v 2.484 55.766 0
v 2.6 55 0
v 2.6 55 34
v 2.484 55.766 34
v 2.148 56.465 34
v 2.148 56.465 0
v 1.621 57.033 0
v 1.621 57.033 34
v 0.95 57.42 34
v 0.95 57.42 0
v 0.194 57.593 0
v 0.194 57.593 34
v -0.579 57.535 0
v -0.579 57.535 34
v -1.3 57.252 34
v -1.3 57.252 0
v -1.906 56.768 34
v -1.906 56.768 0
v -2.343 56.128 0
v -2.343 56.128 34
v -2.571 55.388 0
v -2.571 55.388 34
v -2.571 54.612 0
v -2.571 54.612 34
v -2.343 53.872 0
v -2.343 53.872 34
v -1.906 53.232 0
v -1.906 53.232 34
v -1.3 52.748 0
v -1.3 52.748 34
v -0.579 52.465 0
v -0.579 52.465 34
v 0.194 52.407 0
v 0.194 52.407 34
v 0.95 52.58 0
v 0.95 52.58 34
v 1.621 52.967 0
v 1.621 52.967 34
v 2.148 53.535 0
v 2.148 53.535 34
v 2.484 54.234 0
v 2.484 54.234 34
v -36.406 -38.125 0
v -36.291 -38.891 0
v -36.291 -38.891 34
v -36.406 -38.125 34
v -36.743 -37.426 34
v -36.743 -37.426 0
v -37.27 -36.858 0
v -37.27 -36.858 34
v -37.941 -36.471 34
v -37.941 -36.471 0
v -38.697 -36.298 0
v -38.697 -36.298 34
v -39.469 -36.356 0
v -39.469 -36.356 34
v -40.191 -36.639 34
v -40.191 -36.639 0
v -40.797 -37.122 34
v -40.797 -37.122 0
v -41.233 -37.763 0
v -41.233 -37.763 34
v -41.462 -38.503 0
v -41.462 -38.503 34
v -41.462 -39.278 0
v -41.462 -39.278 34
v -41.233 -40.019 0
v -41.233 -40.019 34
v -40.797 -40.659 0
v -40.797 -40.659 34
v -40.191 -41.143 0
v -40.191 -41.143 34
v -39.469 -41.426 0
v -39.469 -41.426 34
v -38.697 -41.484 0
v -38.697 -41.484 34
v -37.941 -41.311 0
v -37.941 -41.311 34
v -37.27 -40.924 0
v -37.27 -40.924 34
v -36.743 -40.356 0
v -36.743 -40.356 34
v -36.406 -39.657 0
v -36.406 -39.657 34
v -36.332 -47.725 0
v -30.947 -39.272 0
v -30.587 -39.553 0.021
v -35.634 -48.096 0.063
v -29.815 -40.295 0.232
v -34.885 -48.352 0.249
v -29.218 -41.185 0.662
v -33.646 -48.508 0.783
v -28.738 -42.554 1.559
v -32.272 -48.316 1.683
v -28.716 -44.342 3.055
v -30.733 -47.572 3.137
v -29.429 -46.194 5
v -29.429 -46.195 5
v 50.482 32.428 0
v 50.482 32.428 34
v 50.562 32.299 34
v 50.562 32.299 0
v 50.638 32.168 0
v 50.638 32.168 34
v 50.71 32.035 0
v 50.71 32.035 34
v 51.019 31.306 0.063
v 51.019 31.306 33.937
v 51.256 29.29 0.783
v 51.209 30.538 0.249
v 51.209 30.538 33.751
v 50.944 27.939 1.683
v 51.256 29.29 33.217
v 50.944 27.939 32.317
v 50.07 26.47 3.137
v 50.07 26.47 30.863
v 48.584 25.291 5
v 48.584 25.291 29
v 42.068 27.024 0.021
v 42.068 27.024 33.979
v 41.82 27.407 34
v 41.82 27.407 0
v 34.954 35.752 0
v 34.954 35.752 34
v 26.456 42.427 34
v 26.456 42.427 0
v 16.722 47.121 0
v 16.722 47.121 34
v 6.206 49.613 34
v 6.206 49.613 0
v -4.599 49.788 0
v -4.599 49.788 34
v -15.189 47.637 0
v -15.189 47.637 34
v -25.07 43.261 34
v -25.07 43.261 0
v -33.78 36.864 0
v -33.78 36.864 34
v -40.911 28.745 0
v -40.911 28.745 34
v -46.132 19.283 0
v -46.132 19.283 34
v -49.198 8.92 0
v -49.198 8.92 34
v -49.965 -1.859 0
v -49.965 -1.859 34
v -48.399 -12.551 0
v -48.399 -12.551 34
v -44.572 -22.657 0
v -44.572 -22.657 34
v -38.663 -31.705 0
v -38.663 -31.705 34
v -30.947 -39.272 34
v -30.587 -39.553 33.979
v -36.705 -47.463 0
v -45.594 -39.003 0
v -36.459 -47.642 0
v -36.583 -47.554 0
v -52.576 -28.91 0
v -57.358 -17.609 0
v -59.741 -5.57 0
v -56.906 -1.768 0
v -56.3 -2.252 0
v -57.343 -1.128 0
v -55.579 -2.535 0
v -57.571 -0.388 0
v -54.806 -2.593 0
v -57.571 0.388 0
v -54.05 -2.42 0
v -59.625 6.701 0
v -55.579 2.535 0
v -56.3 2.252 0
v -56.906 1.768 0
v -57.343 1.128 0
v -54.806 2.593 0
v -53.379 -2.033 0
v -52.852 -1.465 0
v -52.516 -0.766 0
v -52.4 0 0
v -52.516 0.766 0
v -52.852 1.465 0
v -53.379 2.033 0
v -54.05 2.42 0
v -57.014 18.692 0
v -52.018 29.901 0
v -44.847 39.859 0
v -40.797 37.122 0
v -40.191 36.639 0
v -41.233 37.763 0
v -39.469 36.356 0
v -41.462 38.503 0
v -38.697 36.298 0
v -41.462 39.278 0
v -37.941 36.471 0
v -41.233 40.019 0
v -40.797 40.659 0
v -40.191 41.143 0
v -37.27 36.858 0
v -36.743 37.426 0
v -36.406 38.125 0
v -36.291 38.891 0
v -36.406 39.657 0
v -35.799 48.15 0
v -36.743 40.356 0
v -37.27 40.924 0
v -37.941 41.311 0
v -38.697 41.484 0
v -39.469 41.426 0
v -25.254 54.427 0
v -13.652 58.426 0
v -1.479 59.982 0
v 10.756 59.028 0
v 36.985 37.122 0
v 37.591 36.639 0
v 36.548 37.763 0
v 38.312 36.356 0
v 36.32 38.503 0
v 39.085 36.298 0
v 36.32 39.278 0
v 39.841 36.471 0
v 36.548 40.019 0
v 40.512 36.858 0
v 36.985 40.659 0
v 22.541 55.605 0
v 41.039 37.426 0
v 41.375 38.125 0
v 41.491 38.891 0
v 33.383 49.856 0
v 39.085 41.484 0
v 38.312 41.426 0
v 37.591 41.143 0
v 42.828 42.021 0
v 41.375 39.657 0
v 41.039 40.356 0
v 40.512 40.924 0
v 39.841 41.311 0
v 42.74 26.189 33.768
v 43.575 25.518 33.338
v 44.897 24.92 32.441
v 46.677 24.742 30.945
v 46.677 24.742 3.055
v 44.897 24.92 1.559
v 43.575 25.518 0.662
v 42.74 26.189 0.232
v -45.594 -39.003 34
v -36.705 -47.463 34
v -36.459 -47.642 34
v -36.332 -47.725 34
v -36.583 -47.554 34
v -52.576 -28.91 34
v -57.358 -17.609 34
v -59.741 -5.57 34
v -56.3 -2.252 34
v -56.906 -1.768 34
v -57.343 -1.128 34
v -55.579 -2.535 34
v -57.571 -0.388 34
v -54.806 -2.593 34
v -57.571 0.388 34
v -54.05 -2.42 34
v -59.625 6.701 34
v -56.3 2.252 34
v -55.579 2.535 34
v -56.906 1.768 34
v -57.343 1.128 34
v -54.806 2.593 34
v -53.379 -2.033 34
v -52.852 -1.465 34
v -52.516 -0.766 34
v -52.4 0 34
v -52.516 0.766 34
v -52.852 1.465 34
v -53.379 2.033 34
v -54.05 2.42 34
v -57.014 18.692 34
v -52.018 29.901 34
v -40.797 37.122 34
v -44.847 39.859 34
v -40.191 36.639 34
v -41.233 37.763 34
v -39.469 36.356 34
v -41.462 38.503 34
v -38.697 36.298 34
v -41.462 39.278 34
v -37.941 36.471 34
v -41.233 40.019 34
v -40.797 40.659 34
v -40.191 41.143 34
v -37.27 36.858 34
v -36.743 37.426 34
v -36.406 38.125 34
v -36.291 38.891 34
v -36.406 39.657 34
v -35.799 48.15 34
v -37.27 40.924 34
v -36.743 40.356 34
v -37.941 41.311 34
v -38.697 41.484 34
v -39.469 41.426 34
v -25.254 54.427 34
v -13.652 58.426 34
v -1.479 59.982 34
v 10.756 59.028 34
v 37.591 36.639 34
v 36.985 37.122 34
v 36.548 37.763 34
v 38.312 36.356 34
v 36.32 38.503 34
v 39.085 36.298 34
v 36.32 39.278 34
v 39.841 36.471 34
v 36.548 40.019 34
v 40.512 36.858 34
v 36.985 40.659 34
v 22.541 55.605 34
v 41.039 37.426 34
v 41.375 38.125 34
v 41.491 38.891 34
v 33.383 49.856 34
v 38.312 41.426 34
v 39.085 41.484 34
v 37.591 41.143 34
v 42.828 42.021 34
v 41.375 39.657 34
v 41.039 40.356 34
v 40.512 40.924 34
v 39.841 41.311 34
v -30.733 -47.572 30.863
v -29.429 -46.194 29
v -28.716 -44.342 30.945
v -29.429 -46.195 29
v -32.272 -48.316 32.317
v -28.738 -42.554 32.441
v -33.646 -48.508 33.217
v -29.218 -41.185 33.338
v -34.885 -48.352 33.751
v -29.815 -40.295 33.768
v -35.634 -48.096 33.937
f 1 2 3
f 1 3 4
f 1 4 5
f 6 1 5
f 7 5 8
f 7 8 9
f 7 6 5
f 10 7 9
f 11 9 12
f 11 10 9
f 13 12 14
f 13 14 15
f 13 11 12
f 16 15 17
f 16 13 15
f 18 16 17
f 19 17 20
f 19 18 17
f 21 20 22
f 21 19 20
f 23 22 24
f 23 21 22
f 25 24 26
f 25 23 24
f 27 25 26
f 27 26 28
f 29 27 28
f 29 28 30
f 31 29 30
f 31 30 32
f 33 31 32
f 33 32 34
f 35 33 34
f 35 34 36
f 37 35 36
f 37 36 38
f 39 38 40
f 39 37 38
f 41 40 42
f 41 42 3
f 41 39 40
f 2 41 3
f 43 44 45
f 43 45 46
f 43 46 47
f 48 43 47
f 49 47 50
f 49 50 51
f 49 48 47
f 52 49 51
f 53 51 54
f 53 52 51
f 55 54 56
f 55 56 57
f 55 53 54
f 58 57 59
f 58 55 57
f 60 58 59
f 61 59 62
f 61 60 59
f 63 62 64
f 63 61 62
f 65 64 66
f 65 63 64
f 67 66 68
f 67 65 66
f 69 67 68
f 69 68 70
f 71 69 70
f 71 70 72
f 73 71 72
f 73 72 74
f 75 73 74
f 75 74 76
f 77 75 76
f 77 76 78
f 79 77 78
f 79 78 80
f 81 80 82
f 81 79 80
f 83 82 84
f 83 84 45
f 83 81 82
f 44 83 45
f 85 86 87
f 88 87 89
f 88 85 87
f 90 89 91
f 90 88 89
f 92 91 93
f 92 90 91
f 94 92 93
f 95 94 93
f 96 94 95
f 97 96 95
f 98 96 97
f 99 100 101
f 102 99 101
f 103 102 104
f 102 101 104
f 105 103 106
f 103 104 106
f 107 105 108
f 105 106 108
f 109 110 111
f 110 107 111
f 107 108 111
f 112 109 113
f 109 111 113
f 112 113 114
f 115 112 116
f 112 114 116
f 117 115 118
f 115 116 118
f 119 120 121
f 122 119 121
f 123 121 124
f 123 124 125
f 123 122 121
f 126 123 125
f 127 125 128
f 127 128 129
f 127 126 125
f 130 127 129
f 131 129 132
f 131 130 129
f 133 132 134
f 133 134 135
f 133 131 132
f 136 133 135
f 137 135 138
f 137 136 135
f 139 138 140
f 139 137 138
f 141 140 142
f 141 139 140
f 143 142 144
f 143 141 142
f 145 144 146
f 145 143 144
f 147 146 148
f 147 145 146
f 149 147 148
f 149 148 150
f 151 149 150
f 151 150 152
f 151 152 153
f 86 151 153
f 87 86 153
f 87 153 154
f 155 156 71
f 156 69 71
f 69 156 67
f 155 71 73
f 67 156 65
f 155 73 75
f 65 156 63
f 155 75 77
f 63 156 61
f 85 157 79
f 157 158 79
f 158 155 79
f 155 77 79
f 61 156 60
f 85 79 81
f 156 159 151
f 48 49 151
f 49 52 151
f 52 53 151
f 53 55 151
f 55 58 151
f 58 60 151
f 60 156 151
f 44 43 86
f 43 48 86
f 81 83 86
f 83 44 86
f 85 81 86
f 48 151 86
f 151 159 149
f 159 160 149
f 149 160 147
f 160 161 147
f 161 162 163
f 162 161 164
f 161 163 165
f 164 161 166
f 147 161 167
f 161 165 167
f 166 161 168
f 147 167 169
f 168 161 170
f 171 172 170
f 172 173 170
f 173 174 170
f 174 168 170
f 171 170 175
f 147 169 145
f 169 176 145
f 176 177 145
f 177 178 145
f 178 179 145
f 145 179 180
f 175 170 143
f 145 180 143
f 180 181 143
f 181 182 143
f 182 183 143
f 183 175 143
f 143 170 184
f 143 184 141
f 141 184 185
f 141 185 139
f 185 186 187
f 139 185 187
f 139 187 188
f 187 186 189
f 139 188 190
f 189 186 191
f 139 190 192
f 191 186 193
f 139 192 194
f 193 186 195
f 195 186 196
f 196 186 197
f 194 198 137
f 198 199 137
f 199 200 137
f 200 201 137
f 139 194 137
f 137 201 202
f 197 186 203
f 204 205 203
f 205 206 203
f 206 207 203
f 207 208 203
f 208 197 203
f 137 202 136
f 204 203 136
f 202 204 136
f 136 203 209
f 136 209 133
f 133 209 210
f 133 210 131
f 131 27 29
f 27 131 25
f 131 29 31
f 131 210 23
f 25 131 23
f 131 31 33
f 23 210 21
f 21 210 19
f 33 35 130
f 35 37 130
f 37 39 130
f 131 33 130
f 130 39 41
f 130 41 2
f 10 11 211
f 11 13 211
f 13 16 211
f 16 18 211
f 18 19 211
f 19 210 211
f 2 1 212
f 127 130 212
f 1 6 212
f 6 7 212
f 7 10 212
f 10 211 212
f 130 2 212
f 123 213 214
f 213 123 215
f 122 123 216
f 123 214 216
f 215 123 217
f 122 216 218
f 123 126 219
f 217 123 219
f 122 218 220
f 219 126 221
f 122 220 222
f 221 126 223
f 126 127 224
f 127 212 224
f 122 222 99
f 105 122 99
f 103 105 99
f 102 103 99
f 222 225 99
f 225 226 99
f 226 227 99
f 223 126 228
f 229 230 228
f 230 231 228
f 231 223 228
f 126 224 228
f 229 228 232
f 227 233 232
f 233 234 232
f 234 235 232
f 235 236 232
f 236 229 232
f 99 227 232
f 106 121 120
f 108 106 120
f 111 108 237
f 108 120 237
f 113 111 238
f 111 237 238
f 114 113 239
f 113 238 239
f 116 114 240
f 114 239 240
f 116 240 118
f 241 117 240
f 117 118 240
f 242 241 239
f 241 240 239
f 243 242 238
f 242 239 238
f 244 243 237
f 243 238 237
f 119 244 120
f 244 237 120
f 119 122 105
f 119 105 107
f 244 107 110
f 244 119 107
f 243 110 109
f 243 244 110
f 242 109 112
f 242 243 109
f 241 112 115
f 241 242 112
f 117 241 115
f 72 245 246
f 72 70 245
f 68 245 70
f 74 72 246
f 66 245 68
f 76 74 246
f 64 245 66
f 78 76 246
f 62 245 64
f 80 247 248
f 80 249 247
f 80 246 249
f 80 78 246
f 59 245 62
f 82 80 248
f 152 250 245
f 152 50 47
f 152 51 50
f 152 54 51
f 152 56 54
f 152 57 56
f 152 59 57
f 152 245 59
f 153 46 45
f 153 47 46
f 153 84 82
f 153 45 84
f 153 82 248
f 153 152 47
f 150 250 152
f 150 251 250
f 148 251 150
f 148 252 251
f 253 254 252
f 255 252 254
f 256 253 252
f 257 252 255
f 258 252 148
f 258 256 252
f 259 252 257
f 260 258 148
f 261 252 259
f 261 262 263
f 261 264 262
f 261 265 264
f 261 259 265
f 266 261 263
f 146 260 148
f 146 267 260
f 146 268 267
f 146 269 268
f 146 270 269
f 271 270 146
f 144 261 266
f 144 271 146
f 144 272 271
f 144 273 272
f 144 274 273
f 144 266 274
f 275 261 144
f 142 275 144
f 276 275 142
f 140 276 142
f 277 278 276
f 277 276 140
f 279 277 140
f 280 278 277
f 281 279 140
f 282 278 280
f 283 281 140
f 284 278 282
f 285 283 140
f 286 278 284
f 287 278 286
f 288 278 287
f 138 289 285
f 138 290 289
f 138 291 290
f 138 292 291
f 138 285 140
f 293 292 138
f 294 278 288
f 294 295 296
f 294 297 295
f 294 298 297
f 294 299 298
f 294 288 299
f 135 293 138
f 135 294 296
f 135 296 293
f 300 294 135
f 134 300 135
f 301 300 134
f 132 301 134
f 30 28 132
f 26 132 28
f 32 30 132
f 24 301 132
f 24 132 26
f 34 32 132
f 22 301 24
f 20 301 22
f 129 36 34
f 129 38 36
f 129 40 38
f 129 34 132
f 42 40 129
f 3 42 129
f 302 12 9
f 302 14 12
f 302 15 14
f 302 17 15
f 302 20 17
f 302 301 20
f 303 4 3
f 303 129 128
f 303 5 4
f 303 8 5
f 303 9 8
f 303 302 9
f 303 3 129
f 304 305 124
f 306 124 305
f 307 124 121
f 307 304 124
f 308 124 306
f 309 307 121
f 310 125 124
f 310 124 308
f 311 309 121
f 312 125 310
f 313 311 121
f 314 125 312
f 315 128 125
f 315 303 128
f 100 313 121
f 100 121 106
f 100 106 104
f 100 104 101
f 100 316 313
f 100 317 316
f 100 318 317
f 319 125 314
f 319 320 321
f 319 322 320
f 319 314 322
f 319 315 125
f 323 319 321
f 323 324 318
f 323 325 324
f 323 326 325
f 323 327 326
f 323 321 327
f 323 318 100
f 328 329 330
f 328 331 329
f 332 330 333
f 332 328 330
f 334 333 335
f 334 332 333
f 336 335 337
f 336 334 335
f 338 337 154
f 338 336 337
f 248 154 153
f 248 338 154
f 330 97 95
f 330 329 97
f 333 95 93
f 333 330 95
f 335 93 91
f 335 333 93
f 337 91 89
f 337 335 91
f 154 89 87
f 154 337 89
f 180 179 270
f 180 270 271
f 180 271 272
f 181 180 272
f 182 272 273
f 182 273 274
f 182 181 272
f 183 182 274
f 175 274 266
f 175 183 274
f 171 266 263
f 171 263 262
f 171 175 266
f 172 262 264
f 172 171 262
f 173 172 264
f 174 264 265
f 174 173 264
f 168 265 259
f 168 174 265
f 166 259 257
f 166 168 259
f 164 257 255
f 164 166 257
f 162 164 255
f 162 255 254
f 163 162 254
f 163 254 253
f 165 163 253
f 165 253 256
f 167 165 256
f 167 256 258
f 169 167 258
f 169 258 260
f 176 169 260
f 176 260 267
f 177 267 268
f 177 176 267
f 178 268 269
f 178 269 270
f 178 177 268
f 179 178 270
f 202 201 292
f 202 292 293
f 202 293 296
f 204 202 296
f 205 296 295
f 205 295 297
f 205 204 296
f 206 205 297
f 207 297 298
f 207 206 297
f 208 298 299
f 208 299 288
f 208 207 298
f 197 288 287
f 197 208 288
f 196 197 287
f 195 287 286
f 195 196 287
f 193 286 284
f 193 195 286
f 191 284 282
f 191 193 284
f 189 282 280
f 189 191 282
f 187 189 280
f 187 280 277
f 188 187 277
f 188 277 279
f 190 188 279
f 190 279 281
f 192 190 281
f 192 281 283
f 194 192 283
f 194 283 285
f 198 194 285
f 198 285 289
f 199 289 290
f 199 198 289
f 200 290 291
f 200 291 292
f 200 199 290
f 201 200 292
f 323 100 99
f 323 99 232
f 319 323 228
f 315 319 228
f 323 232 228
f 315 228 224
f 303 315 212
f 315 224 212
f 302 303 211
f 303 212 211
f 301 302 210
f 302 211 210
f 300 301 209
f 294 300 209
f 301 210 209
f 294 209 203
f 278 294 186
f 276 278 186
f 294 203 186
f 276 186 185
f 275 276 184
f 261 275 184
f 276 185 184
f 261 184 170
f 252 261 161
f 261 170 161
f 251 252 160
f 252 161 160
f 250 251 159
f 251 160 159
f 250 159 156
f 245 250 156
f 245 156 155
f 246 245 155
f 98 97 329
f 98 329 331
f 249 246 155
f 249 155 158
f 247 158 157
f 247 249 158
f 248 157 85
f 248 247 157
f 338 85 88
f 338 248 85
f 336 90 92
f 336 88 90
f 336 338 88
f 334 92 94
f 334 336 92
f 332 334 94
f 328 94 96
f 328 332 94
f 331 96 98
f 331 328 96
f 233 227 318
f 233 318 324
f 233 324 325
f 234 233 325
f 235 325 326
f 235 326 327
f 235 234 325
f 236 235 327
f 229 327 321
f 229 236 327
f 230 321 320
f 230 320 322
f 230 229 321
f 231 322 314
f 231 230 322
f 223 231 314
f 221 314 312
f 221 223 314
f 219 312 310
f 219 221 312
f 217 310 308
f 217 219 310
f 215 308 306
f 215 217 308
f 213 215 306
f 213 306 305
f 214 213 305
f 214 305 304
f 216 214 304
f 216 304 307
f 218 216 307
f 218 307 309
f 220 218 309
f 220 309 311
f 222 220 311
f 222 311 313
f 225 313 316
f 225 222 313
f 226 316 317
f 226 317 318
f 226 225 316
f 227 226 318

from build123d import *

# Parameters (mm, degrees)
SKETCH_2_R          = 60
SKETCH_2_R_2        = 2.6
SKETCH_2_R_3        = 50
EXTRUDE_1_DEPTH     = 34
CUT_EXTRUDE_START   = -34
SKETCH_3_R          = 2.6
CUT_EXTRUDE_1_DEPTH = 34
FILLET_1_R          = 5


with BuildPart() as part:
    # 草图2 → 凸台-拉伸1 (new body)
    with BuildSketch(Plane.XY):
        Circle(SKETCH_2_R)
        with Locations((0, 55)):
            Circle(SKETCH_2_R_2, mode=Mode.SUBTRACT)
        with Locations((38.890872965, 38.890872965)):
            Circle(SKETCH_2_R_2, mode=Mode.SUBTRACT)
        with Locations((55, 0)):
            Circle(SKETCH_2_R_2, mode=Mode.SUBTRACT)
        with Locations((38.890872965, -38.890872965)):
            Circle(SKETCH_2_R_2, mode=Mode.SUBTRACT)
        with Locations((0, -55)):
            Circle(SKETCH_2_R_2, mode=Mode.SUBTRACT)
        with Locations((-38.890872965, -38.890872965)):
            Circle(SKETCH_2_R_2, mode=Mode.SUBTRACT)
        with Locations((-55, 0)):
            Circle(SKETCH_2_R_2, mode=Mode.SUBTRACT)
        with Locations((-38.890872965, 38.890872965)):
            Circle(SKETCH_2_R_2, mode=Mode.SUBTRACT)
        Circle(SKETCH_2_R_3, mode=Mode.SUBTRACT)
    extrude(amount=EXTRUDE_1_DEPTH)

    # 草图3 → 切除-拉伸1 (cut)
    with BuildSketch(Plane.XY.offset(34).offset(CUT_EXTRUDE_START)):
        with BuildLine():
            Line((53.220649991, 27.704916794), (44.350541659, 23.087430662))
            ThreePointArc((44.350541659, 23.087430662), (48.567103491, 11.884294616), (50, 0))
            ThreePointArc((50, 0), (24.049438446, -43.836337785), (-26.864980417, -42.169572291))
            Line((-26.864980417, -42.169572291), (-32.237976501, -50.603486749))
            ThreePointArc((-32.237976501, -50.603486749), (28.859326135, -52.603605342), (60, 0))
            ThreePointArc((60, 0), (58.280524189, 14.26115354), (53.220649991, 27.704916794))
        make_face()
        with Locations((0, -55)):
            Circle(SKETCH_3_R, mode=Mode.SUBTRACT)
        with Locations((38.890872965, -38.890872965)):
            Circle(SKETCH_3_R, mode=Mode.SUBTRACT)
        with Locations((55, 0)):
            Circle(SKETCH_3_R, mode=Mode.SUBTRACT)
    extrude(amount=CUT_EXTRUDE_1_DEPTH, mode=Mode.SUBTRACT)

    # 圆角1
    fillet_1_edges = [part.edges().sort_by_distance(p)[0] for p in [
        (-26.864980417, -42.169572291, 17),
        (48.785595825, 25.396173728, 34),
        (44.350541659, 23.087430662, 17),
        (53.220649991, 27.704916794, 17),
        (-29.551478459, -46.38652952, 0),
        (-32.237976501, -50.603486749, 17),
        (48.785595825, 25.396173728, 0),
        (-29.551478459, -46.38652952, 34),
    ]]
    fillet(fillet_1_edges, radius=FILLET_1_R - 0.0001)  # a hair under: the kernel refuses the full size


solid = part.part
